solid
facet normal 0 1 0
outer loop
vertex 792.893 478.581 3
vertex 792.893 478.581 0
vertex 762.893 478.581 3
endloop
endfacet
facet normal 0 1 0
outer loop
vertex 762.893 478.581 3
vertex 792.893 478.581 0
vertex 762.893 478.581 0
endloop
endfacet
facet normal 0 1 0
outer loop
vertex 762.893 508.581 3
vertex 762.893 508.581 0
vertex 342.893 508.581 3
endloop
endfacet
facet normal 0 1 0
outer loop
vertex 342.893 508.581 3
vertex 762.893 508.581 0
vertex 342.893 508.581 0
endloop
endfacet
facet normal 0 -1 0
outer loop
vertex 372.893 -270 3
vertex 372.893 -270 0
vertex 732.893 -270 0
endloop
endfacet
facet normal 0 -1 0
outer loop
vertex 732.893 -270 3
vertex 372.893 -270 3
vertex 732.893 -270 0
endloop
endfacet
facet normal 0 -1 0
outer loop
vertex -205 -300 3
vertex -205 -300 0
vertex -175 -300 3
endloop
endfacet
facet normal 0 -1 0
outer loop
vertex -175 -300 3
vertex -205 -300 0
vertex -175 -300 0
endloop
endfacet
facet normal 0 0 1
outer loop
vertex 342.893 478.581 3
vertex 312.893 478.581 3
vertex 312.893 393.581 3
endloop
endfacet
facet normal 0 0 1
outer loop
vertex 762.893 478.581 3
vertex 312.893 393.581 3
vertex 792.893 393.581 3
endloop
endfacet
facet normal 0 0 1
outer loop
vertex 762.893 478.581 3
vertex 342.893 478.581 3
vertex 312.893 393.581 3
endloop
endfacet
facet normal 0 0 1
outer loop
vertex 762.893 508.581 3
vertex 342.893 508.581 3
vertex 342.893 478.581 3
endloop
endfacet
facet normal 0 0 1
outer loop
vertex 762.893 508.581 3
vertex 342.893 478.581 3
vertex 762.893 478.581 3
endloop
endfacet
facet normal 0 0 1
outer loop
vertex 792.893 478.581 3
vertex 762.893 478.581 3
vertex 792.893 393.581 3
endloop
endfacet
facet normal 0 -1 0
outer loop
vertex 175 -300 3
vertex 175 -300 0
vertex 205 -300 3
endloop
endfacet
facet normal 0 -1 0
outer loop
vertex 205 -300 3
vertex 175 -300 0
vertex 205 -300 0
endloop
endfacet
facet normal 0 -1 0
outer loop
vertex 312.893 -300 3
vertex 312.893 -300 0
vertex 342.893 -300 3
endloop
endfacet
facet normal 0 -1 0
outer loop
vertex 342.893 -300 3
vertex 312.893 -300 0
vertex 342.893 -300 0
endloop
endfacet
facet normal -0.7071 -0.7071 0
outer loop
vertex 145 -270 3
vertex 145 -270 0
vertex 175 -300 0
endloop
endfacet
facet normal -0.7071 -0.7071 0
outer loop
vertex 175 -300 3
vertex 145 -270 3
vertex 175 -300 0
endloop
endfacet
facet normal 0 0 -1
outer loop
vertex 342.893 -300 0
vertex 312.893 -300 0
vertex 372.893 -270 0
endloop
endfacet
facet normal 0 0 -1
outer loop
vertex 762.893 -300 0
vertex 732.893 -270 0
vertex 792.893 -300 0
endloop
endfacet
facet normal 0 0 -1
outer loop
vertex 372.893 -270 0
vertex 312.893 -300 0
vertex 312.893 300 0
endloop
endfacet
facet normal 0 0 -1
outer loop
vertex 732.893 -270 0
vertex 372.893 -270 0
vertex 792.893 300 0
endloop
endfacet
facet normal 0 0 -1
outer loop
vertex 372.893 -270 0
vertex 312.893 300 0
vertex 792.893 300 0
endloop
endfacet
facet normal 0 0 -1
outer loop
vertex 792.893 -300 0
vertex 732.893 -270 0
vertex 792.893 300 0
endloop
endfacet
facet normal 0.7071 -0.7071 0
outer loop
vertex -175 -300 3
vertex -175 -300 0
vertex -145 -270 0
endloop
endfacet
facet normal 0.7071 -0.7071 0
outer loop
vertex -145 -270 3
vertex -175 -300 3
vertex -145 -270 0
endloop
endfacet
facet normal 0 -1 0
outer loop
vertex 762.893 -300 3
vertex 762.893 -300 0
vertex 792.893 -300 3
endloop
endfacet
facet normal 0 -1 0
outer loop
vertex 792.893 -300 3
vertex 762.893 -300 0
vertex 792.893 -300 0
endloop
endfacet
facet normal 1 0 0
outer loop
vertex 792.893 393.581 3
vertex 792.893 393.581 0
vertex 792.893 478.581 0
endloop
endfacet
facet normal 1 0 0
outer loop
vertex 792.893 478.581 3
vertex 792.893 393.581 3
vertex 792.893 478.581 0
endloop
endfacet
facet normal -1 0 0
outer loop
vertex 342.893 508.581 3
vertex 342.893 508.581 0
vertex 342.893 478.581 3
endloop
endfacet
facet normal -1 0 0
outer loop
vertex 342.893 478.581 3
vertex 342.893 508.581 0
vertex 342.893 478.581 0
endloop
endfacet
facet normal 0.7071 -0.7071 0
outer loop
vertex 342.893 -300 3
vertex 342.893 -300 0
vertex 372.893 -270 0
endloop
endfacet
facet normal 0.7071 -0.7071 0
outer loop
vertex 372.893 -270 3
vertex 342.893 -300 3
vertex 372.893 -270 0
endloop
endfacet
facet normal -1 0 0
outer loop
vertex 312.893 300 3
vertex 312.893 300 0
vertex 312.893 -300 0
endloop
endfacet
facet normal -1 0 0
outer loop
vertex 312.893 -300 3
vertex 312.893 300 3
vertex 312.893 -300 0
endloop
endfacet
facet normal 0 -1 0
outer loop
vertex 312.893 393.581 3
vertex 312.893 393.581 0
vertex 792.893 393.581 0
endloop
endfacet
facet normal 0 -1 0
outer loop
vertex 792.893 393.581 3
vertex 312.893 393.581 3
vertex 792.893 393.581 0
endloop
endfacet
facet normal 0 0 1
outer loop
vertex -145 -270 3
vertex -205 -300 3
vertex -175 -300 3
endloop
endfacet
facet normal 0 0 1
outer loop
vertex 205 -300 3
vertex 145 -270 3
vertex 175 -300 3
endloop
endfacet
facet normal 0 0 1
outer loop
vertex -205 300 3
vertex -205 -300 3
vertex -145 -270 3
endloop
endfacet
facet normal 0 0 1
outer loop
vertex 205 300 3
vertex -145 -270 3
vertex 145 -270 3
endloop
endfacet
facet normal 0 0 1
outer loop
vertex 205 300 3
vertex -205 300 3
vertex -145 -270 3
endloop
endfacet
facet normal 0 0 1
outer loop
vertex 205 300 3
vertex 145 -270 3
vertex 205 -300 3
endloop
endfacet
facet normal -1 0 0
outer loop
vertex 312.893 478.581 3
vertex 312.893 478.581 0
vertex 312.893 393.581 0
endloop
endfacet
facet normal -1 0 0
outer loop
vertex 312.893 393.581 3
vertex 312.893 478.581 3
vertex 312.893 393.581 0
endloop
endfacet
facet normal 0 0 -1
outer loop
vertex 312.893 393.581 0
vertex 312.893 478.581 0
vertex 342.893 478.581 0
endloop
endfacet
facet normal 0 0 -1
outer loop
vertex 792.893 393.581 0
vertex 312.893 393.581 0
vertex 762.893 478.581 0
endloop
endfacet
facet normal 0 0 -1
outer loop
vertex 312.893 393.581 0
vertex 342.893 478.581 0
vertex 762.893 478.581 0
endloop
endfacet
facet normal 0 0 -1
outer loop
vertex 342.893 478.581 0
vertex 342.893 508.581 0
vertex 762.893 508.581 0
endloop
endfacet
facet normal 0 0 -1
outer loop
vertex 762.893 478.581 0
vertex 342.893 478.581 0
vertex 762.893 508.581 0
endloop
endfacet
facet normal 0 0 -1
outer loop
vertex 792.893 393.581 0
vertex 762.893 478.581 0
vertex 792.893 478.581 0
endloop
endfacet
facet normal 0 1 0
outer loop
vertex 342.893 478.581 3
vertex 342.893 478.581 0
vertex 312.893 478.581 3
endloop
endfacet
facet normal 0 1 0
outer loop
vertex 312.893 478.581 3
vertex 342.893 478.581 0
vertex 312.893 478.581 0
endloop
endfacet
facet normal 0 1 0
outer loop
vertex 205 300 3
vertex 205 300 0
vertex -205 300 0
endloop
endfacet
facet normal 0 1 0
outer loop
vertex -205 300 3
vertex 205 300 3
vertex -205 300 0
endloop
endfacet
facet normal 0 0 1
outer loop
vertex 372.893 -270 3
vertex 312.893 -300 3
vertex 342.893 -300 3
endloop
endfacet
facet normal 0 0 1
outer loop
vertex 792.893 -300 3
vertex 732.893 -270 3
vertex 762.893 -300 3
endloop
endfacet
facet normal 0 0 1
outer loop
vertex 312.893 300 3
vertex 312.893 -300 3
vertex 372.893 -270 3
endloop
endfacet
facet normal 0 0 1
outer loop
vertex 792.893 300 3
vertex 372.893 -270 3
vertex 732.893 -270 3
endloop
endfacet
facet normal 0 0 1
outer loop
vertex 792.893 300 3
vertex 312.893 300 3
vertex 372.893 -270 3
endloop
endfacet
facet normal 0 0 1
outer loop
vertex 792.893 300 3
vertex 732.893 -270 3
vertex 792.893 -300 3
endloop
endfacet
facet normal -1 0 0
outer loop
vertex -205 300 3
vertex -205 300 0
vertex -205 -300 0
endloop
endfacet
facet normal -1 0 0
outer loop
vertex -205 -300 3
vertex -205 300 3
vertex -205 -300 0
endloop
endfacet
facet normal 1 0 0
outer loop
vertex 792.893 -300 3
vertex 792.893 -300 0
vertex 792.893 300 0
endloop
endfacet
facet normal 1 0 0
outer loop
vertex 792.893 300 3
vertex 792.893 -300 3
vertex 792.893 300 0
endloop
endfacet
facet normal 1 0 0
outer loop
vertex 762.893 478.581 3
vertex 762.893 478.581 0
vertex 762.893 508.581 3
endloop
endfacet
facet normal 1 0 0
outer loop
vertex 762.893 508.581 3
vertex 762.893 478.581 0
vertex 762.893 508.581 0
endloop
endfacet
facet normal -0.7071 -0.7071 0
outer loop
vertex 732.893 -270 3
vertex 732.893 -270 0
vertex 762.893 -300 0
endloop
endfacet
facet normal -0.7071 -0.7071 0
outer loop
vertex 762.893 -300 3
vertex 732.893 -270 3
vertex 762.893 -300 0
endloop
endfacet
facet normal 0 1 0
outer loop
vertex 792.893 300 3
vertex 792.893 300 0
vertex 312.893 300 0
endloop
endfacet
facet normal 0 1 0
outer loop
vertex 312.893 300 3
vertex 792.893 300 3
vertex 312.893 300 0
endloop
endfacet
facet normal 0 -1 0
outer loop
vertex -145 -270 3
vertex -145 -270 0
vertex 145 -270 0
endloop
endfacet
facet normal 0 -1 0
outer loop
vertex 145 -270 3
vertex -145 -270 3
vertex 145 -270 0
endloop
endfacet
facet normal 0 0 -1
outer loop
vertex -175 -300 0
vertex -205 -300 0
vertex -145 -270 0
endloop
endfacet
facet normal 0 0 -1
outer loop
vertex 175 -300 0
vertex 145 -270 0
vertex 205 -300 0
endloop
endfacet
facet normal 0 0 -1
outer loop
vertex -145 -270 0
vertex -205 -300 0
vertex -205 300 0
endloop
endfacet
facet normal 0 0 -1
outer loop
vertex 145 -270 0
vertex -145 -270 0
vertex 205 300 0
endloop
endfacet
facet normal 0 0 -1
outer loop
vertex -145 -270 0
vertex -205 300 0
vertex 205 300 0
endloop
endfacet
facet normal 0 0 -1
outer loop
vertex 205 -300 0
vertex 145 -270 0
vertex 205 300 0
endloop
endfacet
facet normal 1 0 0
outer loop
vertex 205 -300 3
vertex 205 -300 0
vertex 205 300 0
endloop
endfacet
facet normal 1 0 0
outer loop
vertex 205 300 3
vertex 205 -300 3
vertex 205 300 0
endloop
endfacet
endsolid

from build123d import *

# Parameters (mm, degrees)
F3_DEPTH = 3


with BuildPart() as f3:
    # F0 (on Top) + F1 (on Top) + F2 (on Top) → F3 (new body)
    with BuildSketch(Plane.XY):
        Polygon((175, -300), (205, -300), (205, 300), (-205, 300), (-205, -300), (-175, -300), (-145, -270), (145, -270), align=None)
    with BuildSketch(Plane.XY):
        Polygon((312.892625, 300), (312.892625, -300), (342.892625, -300), (372.892625, -270), (732.892625, -270), (762.892625, -300), (792.892625, -300), (792.892625, 300), align=None)
    with BuildSketch(Plane.XY):
        Polygon((312.892625, 393.580892), (792.892625, 393.580892), (792.892625, 478.580892), (762.892625, 478.580892), (762.892625, 508.580892), (342.892625, 508.580892), (342.892625, 478.580892), (312.892625, 478.580892), align=None)
    extrude(amount=F3_DEPTH)


solid = f3.part
